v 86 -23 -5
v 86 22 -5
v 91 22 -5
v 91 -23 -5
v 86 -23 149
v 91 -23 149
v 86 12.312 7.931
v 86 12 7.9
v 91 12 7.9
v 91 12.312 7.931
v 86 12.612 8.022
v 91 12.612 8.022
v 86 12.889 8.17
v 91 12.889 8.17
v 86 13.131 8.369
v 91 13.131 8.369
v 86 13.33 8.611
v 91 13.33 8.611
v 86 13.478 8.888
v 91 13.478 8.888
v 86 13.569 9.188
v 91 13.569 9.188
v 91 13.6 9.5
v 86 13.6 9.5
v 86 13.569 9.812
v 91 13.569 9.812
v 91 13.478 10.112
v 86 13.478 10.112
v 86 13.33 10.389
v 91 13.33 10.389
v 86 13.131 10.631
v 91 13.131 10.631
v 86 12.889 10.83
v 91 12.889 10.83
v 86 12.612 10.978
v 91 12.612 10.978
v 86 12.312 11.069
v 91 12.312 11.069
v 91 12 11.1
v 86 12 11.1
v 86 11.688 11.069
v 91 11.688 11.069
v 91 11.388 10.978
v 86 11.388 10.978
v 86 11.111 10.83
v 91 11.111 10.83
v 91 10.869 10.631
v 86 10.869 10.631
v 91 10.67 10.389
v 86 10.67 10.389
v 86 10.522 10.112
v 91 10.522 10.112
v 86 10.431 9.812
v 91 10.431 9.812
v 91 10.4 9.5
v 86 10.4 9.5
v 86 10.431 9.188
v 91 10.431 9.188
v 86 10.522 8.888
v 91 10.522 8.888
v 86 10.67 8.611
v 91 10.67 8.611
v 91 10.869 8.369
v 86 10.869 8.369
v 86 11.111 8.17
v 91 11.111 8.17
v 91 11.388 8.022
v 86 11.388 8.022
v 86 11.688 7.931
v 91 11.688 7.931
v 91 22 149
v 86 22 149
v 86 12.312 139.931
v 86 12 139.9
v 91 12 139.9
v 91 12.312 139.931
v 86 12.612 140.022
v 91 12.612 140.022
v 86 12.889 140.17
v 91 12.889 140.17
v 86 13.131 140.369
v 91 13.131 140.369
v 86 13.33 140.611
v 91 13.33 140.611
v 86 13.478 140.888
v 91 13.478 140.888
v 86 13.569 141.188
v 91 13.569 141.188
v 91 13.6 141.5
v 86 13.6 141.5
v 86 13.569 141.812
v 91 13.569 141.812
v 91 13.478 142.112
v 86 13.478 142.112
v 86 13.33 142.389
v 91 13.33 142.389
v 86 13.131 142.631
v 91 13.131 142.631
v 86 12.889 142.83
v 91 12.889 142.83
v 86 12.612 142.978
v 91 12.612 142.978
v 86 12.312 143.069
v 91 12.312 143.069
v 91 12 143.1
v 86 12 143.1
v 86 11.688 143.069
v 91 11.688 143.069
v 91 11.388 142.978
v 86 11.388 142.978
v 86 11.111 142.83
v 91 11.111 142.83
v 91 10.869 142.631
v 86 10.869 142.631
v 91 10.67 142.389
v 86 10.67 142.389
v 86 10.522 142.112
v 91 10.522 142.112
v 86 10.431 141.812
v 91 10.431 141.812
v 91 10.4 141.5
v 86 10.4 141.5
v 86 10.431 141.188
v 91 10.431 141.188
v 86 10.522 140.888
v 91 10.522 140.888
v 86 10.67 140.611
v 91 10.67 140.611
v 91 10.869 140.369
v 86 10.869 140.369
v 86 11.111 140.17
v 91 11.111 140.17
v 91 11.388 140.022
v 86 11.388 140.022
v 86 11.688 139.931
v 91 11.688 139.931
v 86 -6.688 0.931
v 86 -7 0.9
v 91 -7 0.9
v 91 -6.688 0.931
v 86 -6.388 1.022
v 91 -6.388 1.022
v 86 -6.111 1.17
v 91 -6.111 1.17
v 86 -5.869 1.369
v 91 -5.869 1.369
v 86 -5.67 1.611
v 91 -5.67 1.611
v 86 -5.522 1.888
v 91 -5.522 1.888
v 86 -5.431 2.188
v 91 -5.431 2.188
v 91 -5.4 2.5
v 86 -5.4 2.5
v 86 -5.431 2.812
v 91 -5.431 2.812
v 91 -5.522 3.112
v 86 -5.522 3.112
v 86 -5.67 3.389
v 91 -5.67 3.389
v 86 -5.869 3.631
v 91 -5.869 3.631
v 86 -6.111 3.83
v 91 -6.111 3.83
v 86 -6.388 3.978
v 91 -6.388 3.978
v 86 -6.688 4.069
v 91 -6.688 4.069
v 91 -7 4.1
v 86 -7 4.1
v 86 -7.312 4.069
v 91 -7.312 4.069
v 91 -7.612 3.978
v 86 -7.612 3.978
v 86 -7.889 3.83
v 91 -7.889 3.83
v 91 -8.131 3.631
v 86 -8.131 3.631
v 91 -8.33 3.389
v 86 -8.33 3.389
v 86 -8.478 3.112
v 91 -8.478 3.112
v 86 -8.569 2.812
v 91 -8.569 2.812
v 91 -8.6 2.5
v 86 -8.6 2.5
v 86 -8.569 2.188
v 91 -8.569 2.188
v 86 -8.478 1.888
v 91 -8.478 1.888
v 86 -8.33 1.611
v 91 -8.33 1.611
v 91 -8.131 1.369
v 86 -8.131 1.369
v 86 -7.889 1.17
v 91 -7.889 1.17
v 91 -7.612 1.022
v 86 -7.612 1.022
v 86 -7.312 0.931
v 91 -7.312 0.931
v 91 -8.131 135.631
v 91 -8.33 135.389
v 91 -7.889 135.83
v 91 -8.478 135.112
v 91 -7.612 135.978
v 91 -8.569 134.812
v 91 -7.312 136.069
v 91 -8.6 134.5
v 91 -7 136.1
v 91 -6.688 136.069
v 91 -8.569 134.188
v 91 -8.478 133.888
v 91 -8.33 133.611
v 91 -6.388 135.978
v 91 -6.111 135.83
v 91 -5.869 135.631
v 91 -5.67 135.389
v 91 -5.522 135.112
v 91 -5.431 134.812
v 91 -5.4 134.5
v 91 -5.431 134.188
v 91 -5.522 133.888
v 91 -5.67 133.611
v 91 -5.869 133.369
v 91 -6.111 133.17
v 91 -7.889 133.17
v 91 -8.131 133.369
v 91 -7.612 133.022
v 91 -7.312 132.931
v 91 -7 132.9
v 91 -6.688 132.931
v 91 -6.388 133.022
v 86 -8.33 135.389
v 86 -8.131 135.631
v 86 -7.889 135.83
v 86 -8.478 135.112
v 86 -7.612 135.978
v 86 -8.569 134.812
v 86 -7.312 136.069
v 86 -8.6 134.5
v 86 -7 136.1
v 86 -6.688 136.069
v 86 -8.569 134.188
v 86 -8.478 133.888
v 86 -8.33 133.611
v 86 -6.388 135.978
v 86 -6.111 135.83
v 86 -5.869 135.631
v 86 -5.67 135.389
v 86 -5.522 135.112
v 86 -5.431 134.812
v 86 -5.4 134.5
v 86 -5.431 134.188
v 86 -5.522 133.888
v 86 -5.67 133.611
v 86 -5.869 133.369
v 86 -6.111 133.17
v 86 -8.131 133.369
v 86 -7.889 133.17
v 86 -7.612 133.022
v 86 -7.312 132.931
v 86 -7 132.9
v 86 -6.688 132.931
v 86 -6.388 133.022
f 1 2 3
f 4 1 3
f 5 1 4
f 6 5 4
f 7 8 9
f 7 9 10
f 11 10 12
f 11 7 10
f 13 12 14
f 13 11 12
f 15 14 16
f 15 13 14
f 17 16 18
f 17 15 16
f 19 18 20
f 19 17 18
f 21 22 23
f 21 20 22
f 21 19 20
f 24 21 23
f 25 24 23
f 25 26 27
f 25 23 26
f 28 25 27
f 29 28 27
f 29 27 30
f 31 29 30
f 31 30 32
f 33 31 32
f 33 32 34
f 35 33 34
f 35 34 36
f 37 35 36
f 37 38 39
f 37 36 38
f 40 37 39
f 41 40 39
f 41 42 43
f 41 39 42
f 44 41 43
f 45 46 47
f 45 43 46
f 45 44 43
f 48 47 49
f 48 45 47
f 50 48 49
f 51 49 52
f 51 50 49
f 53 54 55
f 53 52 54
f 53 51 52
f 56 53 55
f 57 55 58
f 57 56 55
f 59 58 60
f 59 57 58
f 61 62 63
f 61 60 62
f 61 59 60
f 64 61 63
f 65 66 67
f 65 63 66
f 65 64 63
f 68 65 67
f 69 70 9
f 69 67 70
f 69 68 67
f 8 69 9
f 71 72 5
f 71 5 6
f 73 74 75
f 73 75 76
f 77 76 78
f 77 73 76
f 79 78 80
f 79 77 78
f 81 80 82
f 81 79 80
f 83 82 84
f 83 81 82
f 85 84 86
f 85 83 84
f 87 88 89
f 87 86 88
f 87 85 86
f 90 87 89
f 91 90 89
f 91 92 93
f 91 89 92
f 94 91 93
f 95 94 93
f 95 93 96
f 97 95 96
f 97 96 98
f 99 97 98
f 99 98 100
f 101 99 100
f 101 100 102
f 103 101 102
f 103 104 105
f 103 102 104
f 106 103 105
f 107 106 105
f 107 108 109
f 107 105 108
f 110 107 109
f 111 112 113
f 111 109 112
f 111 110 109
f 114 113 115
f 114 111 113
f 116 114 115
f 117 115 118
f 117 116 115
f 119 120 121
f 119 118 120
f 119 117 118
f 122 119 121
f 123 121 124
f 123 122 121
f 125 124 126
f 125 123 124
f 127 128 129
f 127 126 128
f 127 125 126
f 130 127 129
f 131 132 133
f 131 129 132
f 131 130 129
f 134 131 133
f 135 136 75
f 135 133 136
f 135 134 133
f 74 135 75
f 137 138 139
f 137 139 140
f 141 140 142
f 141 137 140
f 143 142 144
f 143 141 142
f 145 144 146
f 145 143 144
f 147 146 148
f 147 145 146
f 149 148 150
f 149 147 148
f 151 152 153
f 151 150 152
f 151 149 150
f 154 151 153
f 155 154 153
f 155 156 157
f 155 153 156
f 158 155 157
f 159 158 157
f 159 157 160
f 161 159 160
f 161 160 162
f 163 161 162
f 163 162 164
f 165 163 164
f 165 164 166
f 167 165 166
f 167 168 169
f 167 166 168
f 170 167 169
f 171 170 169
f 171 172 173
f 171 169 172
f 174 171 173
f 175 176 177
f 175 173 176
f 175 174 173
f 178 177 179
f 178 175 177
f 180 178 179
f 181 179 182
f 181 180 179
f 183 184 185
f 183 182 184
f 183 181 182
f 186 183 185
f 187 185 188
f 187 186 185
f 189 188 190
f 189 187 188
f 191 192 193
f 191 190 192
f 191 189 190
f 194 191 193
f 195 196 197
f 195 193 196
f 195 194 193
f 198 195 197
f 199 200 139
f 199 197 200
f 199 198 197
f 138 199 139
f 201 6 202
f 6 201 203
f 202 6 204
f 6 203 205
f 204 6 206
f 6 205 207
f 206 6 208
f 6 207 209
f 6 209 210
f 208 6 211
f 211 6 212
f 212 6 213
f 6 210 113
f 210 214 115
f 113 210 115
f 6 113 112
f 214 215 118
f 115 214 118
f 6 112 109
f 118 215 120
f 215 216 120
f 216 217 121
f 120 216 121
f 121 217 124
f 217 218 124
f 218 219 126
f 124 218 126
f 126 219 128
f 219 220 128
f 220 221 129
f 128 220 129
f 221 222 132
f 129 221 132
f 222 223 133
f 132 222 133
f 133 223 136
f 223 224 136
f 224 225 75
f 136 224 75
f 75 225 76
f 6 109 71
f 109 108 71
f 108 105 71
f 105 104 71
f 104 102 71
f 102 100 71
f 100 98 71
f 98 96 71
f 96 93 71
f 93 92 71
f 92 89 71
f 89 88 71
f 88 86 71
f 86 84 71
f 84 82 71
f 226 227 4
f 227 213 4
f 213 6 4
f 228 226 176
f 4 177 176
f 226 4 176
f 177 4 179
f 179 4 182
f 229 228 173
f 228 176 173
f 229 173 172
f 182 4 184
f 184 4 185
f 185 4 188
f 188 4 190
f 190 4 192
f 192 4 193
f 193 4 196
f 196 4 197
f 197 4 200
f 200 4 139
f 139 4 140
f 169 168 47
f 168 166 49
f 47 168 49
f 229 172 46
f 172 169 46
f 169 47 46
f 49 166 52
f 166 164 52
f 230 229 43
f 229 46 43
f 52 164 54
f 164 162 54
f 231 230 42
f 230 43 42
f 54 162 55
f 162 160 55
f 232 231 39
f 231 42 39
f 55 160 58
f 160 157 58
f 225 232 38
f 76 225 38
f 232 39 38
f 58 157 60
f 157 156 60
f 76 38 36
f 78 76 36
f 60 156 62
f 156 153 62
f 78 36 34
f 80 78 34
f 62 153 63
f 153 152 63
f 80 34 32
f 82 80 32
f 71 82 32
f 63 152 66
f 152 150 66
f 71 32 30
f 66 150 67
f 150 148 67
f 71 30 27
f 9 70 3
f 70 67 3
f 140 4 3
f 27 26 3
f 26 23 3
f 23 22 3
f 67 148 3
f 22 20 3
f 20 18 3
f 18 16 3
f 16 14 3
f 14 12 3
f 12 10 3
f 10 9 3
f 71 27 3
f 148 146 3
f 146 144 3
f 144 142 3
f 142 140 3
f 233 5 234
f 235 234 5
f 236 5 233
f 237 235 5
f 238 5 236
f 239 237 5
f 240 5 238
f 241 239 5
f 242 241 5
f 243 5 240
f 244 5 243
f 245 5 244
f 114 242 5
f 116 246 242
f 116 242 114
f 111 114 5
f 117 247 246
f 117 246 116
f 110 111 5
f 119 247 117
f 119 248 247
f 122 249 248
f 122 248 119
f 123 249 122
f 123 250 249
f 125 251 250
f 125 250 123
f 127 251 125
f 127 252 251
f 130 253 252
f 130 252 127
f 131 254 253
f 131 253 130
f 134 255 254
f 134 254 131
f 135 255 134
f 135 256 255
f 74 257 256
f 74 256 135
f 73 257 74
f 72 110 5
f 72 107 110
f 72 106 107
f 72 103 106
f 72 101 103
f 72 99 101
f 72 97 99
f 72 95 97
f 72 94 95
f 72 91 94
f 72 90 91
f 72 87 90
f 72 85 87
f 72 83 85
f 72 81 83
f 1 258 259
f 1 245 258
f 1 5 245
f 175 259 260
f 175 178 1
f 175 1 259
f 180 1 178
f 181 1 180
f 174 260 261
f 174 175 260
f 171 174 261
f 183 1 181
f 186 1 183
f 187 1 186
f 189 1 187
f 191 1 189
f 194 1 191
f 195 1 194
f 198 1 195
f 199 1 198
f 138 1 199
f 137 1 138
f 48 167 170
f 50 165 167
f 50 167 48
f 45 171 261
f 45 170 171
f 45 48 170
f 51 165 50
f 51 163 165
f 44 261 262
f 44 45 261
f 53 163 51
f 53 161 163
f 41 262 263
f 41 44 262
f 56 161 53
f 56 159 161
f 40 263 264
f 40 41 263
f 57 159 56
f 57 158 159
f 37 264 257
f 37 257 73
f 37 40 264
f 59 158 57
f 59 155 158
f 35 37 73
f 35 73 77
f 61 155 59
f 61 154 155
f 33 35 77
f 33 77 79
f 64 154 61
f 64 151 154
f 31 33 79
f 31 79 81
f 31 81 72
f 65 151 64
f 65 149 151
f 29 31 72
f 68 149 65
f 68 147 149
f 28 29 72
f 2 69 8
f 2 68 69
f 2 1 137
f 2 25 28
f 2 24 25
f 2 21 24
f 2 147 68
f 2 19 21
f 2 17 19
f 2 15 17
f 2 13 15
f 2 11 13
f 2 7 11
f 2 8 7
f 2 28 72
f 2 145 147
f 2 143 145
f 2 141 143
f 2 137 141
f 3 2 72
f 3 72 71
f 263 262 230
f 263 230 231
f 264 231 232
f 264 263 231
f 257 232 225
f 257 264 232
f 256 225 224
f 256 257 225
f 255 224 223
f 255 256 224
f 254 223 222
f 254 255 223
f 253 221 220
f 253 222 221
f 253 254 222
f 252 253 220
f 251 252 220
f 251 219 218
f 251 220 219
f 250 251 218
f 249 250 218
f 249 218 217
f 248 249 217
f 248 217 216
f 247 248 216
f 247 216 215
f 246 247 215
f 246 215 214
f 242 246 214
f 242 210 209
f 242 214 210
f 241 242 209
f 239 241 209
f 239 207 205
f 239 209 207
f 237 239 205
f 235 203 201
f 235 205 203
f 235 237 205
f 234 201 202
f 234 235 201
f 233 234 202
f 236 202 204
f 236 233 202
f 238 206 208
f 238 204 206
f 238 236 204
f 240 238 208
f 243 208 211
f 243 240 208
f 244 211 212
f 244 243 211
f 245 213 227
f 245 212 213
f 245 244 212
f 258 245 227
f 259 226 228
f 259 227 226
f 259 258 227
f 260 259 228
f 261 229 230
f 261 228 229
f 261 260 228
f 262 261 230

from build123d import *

# Parameters (mm, degrees)
CYLINDER019_R           = 1.6
CYLINDER019_DEPTH       = 40
CYLINDER019_PITCH_ANGLE = 90
CYLINDER018_R           = 1.6
CYLINDER018_DEPTH       = 40
CYLINDER018_PITCH_ANGLE = 90
CYLINDER017_R           = 1.6
CYLINDER017_DEPTH       = 40
CYLINDER016_R           = 1.6
CYLINDER016_DEPTH       = 70
CYLINDER016_ROLL_ANGLE  = 90
CYLINDER015_R           = 1.6
CYLINDER015_DEPTH       = 40
BOX015_W                = 5
BOX015_H                = 45
BOX015_DEPTH            = 154


with BuildPart() as cylinder100:
    # Cylinder019 → Cylinder019 (new body)
    with BuildSketch(Plane.XY):
        Circle(CYLINDER019_R)
    extrude(amount=CYLINDER019_DEPTH)


with BuildPart() as cylinder100_1:
    # Cylinder019 pitch: moved
    add(cylinder100.part.rotate(Axis((0, 0, 0), (0, 1, 0)), CYLINDER019_PITCH_ANGLE))


with BuildPart() as cylinder100_2:
    # Cylinder019 placement: moved
    add(cylinder100_1.part.moved(Location((-40, 12, 9.5))))


with BuildPart() as fusion011:
    # Cylinder018 → Cylinder018 (new body)
    with BuildSketch(Plane.XY):
        Circle(CYLINDER018_R)
    extrude(amount=CYLINDER018_DEPTH)


with BuildPart() as fusion011_1:
    # Cylinder018 pitch: moved
    add(fusion011.part.rotate(Axis((0, 0, 0), (0, 1, 0)), CYLINDER018_PITCH_ANGLE))


with BuildPart() as fusion011_2:
    # Cylinder018 placement: moved
    add(fusion011_1.part.moved(Location((-40, -7, 2.5))))

    # Fusion011: union Cylinder100
    add(cylinder100_2.part)


with BuildPart() as fusion012:
    # Cylinder017 → Cylinder017 (new body)
    with BuildSketch(Plane(origin=(-27.5, 7, -15), x_dir=(1, 0, 0), z_dir=(0, 0, 1))):
        Circle(CYLINDER017_R)
    extrude(amount=CYLINDER017_DEPTH)

    # Fusion012: union Fusion011
    add(fusion011_2.part)


with BuildPart() as fusion013:
    # Cylinder016 → Cylinder016 (new body)
    with BuildSketch(Plane.XY):
        Circle(CYLINDER016_R)
    extrude(amount=CYLINDER016_DEPTH)


with BuildPart() as fusion013_1:
    # Cylinder016 roll: moved
    add(fusion013.part.rotate(Axis((0, 0, 0), (1, 0, 0)), CYLINDER016_ROLL_ANGLE))


with BuildPart() as fusion013_2:
    # Cylinder016 placement: moved
    add(fusion013_1.part.moved(Location((-24, 39, 6))))

    # Fusion013: union Fusion012
    add(fusion012.part)


with BuildPart() as cylinder008:
    # Cylinder015 → Cylinder015 (new body)
    with BuildSketch(Plane(origin=(-20.5, -12, -15), x_dir=(1, 0, 0), z_dir=(0, 0, 1))):
        Circle(CYLINDER015_R)
    extrude(amount=CYLINDER015_DEPTH)


with BuildPart() as face_corner_holes013:
    # Fusion027 base: copy of Cylinder008
    add(cylinder008.part)

    # Fusion027: union Fusion013
    add(fusion013_2.part)


with BuildPart() as face_corner_holes013_1:
    # Fusion027 placement: moved
    add(face_corner_holes013.part.moved(Location((104, 0, 132))))


with BuildPart() as face_corner_holes001:
    # Fusion015 base: copy of Cylinder008
    add(cylinder008.part)

    # Fusion015: union Fusion013
    add(fusion013_2.part)


with BuildPart() as face_corner_holes001_1:
    # Fusion015 placement: moved
    add(face_corner_holes001.part.moved(Location((104, 0, 0))))


with BuildPart() as top_x:
    # Box015 → Box015 (new body)
    with BuildSketch(Plane(origin=(86, -23, -5), x_dir=(1, 0, 0), z_dir=(0, 0, 1))):
        with Locations((2.5, 22.5)):
            Rectangle(BOX015_W, BOX015_H)
    extrude(amount=BOX015_DEPTH)

    # Cut016: cut face-corner-holes001
    add(face_corner_holes001_1.part, mode=Mode.SUBTRACT)

    # Cut024: cut face-corner-holes013
    add(face_corner_holes013_1.part, mode=Mode.SUBTRACT)


solid = top_x.part
